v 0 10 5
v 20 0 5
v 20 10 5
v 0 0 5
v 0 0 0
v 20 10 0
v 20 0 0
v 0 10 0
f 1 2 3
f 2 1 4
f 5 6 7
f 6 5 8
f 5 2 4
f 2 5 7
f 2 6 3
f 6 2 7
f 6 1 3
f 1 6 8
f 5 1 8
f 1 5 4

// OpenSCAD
Longeur_de_lobjet=10;
Largeur_de_lobjet=20;
Hauteur_de_lobjet=5;
cube([Largeur_de_lobjet,Longeur_de_lobjet,Hauteur_de_lobjet]);
